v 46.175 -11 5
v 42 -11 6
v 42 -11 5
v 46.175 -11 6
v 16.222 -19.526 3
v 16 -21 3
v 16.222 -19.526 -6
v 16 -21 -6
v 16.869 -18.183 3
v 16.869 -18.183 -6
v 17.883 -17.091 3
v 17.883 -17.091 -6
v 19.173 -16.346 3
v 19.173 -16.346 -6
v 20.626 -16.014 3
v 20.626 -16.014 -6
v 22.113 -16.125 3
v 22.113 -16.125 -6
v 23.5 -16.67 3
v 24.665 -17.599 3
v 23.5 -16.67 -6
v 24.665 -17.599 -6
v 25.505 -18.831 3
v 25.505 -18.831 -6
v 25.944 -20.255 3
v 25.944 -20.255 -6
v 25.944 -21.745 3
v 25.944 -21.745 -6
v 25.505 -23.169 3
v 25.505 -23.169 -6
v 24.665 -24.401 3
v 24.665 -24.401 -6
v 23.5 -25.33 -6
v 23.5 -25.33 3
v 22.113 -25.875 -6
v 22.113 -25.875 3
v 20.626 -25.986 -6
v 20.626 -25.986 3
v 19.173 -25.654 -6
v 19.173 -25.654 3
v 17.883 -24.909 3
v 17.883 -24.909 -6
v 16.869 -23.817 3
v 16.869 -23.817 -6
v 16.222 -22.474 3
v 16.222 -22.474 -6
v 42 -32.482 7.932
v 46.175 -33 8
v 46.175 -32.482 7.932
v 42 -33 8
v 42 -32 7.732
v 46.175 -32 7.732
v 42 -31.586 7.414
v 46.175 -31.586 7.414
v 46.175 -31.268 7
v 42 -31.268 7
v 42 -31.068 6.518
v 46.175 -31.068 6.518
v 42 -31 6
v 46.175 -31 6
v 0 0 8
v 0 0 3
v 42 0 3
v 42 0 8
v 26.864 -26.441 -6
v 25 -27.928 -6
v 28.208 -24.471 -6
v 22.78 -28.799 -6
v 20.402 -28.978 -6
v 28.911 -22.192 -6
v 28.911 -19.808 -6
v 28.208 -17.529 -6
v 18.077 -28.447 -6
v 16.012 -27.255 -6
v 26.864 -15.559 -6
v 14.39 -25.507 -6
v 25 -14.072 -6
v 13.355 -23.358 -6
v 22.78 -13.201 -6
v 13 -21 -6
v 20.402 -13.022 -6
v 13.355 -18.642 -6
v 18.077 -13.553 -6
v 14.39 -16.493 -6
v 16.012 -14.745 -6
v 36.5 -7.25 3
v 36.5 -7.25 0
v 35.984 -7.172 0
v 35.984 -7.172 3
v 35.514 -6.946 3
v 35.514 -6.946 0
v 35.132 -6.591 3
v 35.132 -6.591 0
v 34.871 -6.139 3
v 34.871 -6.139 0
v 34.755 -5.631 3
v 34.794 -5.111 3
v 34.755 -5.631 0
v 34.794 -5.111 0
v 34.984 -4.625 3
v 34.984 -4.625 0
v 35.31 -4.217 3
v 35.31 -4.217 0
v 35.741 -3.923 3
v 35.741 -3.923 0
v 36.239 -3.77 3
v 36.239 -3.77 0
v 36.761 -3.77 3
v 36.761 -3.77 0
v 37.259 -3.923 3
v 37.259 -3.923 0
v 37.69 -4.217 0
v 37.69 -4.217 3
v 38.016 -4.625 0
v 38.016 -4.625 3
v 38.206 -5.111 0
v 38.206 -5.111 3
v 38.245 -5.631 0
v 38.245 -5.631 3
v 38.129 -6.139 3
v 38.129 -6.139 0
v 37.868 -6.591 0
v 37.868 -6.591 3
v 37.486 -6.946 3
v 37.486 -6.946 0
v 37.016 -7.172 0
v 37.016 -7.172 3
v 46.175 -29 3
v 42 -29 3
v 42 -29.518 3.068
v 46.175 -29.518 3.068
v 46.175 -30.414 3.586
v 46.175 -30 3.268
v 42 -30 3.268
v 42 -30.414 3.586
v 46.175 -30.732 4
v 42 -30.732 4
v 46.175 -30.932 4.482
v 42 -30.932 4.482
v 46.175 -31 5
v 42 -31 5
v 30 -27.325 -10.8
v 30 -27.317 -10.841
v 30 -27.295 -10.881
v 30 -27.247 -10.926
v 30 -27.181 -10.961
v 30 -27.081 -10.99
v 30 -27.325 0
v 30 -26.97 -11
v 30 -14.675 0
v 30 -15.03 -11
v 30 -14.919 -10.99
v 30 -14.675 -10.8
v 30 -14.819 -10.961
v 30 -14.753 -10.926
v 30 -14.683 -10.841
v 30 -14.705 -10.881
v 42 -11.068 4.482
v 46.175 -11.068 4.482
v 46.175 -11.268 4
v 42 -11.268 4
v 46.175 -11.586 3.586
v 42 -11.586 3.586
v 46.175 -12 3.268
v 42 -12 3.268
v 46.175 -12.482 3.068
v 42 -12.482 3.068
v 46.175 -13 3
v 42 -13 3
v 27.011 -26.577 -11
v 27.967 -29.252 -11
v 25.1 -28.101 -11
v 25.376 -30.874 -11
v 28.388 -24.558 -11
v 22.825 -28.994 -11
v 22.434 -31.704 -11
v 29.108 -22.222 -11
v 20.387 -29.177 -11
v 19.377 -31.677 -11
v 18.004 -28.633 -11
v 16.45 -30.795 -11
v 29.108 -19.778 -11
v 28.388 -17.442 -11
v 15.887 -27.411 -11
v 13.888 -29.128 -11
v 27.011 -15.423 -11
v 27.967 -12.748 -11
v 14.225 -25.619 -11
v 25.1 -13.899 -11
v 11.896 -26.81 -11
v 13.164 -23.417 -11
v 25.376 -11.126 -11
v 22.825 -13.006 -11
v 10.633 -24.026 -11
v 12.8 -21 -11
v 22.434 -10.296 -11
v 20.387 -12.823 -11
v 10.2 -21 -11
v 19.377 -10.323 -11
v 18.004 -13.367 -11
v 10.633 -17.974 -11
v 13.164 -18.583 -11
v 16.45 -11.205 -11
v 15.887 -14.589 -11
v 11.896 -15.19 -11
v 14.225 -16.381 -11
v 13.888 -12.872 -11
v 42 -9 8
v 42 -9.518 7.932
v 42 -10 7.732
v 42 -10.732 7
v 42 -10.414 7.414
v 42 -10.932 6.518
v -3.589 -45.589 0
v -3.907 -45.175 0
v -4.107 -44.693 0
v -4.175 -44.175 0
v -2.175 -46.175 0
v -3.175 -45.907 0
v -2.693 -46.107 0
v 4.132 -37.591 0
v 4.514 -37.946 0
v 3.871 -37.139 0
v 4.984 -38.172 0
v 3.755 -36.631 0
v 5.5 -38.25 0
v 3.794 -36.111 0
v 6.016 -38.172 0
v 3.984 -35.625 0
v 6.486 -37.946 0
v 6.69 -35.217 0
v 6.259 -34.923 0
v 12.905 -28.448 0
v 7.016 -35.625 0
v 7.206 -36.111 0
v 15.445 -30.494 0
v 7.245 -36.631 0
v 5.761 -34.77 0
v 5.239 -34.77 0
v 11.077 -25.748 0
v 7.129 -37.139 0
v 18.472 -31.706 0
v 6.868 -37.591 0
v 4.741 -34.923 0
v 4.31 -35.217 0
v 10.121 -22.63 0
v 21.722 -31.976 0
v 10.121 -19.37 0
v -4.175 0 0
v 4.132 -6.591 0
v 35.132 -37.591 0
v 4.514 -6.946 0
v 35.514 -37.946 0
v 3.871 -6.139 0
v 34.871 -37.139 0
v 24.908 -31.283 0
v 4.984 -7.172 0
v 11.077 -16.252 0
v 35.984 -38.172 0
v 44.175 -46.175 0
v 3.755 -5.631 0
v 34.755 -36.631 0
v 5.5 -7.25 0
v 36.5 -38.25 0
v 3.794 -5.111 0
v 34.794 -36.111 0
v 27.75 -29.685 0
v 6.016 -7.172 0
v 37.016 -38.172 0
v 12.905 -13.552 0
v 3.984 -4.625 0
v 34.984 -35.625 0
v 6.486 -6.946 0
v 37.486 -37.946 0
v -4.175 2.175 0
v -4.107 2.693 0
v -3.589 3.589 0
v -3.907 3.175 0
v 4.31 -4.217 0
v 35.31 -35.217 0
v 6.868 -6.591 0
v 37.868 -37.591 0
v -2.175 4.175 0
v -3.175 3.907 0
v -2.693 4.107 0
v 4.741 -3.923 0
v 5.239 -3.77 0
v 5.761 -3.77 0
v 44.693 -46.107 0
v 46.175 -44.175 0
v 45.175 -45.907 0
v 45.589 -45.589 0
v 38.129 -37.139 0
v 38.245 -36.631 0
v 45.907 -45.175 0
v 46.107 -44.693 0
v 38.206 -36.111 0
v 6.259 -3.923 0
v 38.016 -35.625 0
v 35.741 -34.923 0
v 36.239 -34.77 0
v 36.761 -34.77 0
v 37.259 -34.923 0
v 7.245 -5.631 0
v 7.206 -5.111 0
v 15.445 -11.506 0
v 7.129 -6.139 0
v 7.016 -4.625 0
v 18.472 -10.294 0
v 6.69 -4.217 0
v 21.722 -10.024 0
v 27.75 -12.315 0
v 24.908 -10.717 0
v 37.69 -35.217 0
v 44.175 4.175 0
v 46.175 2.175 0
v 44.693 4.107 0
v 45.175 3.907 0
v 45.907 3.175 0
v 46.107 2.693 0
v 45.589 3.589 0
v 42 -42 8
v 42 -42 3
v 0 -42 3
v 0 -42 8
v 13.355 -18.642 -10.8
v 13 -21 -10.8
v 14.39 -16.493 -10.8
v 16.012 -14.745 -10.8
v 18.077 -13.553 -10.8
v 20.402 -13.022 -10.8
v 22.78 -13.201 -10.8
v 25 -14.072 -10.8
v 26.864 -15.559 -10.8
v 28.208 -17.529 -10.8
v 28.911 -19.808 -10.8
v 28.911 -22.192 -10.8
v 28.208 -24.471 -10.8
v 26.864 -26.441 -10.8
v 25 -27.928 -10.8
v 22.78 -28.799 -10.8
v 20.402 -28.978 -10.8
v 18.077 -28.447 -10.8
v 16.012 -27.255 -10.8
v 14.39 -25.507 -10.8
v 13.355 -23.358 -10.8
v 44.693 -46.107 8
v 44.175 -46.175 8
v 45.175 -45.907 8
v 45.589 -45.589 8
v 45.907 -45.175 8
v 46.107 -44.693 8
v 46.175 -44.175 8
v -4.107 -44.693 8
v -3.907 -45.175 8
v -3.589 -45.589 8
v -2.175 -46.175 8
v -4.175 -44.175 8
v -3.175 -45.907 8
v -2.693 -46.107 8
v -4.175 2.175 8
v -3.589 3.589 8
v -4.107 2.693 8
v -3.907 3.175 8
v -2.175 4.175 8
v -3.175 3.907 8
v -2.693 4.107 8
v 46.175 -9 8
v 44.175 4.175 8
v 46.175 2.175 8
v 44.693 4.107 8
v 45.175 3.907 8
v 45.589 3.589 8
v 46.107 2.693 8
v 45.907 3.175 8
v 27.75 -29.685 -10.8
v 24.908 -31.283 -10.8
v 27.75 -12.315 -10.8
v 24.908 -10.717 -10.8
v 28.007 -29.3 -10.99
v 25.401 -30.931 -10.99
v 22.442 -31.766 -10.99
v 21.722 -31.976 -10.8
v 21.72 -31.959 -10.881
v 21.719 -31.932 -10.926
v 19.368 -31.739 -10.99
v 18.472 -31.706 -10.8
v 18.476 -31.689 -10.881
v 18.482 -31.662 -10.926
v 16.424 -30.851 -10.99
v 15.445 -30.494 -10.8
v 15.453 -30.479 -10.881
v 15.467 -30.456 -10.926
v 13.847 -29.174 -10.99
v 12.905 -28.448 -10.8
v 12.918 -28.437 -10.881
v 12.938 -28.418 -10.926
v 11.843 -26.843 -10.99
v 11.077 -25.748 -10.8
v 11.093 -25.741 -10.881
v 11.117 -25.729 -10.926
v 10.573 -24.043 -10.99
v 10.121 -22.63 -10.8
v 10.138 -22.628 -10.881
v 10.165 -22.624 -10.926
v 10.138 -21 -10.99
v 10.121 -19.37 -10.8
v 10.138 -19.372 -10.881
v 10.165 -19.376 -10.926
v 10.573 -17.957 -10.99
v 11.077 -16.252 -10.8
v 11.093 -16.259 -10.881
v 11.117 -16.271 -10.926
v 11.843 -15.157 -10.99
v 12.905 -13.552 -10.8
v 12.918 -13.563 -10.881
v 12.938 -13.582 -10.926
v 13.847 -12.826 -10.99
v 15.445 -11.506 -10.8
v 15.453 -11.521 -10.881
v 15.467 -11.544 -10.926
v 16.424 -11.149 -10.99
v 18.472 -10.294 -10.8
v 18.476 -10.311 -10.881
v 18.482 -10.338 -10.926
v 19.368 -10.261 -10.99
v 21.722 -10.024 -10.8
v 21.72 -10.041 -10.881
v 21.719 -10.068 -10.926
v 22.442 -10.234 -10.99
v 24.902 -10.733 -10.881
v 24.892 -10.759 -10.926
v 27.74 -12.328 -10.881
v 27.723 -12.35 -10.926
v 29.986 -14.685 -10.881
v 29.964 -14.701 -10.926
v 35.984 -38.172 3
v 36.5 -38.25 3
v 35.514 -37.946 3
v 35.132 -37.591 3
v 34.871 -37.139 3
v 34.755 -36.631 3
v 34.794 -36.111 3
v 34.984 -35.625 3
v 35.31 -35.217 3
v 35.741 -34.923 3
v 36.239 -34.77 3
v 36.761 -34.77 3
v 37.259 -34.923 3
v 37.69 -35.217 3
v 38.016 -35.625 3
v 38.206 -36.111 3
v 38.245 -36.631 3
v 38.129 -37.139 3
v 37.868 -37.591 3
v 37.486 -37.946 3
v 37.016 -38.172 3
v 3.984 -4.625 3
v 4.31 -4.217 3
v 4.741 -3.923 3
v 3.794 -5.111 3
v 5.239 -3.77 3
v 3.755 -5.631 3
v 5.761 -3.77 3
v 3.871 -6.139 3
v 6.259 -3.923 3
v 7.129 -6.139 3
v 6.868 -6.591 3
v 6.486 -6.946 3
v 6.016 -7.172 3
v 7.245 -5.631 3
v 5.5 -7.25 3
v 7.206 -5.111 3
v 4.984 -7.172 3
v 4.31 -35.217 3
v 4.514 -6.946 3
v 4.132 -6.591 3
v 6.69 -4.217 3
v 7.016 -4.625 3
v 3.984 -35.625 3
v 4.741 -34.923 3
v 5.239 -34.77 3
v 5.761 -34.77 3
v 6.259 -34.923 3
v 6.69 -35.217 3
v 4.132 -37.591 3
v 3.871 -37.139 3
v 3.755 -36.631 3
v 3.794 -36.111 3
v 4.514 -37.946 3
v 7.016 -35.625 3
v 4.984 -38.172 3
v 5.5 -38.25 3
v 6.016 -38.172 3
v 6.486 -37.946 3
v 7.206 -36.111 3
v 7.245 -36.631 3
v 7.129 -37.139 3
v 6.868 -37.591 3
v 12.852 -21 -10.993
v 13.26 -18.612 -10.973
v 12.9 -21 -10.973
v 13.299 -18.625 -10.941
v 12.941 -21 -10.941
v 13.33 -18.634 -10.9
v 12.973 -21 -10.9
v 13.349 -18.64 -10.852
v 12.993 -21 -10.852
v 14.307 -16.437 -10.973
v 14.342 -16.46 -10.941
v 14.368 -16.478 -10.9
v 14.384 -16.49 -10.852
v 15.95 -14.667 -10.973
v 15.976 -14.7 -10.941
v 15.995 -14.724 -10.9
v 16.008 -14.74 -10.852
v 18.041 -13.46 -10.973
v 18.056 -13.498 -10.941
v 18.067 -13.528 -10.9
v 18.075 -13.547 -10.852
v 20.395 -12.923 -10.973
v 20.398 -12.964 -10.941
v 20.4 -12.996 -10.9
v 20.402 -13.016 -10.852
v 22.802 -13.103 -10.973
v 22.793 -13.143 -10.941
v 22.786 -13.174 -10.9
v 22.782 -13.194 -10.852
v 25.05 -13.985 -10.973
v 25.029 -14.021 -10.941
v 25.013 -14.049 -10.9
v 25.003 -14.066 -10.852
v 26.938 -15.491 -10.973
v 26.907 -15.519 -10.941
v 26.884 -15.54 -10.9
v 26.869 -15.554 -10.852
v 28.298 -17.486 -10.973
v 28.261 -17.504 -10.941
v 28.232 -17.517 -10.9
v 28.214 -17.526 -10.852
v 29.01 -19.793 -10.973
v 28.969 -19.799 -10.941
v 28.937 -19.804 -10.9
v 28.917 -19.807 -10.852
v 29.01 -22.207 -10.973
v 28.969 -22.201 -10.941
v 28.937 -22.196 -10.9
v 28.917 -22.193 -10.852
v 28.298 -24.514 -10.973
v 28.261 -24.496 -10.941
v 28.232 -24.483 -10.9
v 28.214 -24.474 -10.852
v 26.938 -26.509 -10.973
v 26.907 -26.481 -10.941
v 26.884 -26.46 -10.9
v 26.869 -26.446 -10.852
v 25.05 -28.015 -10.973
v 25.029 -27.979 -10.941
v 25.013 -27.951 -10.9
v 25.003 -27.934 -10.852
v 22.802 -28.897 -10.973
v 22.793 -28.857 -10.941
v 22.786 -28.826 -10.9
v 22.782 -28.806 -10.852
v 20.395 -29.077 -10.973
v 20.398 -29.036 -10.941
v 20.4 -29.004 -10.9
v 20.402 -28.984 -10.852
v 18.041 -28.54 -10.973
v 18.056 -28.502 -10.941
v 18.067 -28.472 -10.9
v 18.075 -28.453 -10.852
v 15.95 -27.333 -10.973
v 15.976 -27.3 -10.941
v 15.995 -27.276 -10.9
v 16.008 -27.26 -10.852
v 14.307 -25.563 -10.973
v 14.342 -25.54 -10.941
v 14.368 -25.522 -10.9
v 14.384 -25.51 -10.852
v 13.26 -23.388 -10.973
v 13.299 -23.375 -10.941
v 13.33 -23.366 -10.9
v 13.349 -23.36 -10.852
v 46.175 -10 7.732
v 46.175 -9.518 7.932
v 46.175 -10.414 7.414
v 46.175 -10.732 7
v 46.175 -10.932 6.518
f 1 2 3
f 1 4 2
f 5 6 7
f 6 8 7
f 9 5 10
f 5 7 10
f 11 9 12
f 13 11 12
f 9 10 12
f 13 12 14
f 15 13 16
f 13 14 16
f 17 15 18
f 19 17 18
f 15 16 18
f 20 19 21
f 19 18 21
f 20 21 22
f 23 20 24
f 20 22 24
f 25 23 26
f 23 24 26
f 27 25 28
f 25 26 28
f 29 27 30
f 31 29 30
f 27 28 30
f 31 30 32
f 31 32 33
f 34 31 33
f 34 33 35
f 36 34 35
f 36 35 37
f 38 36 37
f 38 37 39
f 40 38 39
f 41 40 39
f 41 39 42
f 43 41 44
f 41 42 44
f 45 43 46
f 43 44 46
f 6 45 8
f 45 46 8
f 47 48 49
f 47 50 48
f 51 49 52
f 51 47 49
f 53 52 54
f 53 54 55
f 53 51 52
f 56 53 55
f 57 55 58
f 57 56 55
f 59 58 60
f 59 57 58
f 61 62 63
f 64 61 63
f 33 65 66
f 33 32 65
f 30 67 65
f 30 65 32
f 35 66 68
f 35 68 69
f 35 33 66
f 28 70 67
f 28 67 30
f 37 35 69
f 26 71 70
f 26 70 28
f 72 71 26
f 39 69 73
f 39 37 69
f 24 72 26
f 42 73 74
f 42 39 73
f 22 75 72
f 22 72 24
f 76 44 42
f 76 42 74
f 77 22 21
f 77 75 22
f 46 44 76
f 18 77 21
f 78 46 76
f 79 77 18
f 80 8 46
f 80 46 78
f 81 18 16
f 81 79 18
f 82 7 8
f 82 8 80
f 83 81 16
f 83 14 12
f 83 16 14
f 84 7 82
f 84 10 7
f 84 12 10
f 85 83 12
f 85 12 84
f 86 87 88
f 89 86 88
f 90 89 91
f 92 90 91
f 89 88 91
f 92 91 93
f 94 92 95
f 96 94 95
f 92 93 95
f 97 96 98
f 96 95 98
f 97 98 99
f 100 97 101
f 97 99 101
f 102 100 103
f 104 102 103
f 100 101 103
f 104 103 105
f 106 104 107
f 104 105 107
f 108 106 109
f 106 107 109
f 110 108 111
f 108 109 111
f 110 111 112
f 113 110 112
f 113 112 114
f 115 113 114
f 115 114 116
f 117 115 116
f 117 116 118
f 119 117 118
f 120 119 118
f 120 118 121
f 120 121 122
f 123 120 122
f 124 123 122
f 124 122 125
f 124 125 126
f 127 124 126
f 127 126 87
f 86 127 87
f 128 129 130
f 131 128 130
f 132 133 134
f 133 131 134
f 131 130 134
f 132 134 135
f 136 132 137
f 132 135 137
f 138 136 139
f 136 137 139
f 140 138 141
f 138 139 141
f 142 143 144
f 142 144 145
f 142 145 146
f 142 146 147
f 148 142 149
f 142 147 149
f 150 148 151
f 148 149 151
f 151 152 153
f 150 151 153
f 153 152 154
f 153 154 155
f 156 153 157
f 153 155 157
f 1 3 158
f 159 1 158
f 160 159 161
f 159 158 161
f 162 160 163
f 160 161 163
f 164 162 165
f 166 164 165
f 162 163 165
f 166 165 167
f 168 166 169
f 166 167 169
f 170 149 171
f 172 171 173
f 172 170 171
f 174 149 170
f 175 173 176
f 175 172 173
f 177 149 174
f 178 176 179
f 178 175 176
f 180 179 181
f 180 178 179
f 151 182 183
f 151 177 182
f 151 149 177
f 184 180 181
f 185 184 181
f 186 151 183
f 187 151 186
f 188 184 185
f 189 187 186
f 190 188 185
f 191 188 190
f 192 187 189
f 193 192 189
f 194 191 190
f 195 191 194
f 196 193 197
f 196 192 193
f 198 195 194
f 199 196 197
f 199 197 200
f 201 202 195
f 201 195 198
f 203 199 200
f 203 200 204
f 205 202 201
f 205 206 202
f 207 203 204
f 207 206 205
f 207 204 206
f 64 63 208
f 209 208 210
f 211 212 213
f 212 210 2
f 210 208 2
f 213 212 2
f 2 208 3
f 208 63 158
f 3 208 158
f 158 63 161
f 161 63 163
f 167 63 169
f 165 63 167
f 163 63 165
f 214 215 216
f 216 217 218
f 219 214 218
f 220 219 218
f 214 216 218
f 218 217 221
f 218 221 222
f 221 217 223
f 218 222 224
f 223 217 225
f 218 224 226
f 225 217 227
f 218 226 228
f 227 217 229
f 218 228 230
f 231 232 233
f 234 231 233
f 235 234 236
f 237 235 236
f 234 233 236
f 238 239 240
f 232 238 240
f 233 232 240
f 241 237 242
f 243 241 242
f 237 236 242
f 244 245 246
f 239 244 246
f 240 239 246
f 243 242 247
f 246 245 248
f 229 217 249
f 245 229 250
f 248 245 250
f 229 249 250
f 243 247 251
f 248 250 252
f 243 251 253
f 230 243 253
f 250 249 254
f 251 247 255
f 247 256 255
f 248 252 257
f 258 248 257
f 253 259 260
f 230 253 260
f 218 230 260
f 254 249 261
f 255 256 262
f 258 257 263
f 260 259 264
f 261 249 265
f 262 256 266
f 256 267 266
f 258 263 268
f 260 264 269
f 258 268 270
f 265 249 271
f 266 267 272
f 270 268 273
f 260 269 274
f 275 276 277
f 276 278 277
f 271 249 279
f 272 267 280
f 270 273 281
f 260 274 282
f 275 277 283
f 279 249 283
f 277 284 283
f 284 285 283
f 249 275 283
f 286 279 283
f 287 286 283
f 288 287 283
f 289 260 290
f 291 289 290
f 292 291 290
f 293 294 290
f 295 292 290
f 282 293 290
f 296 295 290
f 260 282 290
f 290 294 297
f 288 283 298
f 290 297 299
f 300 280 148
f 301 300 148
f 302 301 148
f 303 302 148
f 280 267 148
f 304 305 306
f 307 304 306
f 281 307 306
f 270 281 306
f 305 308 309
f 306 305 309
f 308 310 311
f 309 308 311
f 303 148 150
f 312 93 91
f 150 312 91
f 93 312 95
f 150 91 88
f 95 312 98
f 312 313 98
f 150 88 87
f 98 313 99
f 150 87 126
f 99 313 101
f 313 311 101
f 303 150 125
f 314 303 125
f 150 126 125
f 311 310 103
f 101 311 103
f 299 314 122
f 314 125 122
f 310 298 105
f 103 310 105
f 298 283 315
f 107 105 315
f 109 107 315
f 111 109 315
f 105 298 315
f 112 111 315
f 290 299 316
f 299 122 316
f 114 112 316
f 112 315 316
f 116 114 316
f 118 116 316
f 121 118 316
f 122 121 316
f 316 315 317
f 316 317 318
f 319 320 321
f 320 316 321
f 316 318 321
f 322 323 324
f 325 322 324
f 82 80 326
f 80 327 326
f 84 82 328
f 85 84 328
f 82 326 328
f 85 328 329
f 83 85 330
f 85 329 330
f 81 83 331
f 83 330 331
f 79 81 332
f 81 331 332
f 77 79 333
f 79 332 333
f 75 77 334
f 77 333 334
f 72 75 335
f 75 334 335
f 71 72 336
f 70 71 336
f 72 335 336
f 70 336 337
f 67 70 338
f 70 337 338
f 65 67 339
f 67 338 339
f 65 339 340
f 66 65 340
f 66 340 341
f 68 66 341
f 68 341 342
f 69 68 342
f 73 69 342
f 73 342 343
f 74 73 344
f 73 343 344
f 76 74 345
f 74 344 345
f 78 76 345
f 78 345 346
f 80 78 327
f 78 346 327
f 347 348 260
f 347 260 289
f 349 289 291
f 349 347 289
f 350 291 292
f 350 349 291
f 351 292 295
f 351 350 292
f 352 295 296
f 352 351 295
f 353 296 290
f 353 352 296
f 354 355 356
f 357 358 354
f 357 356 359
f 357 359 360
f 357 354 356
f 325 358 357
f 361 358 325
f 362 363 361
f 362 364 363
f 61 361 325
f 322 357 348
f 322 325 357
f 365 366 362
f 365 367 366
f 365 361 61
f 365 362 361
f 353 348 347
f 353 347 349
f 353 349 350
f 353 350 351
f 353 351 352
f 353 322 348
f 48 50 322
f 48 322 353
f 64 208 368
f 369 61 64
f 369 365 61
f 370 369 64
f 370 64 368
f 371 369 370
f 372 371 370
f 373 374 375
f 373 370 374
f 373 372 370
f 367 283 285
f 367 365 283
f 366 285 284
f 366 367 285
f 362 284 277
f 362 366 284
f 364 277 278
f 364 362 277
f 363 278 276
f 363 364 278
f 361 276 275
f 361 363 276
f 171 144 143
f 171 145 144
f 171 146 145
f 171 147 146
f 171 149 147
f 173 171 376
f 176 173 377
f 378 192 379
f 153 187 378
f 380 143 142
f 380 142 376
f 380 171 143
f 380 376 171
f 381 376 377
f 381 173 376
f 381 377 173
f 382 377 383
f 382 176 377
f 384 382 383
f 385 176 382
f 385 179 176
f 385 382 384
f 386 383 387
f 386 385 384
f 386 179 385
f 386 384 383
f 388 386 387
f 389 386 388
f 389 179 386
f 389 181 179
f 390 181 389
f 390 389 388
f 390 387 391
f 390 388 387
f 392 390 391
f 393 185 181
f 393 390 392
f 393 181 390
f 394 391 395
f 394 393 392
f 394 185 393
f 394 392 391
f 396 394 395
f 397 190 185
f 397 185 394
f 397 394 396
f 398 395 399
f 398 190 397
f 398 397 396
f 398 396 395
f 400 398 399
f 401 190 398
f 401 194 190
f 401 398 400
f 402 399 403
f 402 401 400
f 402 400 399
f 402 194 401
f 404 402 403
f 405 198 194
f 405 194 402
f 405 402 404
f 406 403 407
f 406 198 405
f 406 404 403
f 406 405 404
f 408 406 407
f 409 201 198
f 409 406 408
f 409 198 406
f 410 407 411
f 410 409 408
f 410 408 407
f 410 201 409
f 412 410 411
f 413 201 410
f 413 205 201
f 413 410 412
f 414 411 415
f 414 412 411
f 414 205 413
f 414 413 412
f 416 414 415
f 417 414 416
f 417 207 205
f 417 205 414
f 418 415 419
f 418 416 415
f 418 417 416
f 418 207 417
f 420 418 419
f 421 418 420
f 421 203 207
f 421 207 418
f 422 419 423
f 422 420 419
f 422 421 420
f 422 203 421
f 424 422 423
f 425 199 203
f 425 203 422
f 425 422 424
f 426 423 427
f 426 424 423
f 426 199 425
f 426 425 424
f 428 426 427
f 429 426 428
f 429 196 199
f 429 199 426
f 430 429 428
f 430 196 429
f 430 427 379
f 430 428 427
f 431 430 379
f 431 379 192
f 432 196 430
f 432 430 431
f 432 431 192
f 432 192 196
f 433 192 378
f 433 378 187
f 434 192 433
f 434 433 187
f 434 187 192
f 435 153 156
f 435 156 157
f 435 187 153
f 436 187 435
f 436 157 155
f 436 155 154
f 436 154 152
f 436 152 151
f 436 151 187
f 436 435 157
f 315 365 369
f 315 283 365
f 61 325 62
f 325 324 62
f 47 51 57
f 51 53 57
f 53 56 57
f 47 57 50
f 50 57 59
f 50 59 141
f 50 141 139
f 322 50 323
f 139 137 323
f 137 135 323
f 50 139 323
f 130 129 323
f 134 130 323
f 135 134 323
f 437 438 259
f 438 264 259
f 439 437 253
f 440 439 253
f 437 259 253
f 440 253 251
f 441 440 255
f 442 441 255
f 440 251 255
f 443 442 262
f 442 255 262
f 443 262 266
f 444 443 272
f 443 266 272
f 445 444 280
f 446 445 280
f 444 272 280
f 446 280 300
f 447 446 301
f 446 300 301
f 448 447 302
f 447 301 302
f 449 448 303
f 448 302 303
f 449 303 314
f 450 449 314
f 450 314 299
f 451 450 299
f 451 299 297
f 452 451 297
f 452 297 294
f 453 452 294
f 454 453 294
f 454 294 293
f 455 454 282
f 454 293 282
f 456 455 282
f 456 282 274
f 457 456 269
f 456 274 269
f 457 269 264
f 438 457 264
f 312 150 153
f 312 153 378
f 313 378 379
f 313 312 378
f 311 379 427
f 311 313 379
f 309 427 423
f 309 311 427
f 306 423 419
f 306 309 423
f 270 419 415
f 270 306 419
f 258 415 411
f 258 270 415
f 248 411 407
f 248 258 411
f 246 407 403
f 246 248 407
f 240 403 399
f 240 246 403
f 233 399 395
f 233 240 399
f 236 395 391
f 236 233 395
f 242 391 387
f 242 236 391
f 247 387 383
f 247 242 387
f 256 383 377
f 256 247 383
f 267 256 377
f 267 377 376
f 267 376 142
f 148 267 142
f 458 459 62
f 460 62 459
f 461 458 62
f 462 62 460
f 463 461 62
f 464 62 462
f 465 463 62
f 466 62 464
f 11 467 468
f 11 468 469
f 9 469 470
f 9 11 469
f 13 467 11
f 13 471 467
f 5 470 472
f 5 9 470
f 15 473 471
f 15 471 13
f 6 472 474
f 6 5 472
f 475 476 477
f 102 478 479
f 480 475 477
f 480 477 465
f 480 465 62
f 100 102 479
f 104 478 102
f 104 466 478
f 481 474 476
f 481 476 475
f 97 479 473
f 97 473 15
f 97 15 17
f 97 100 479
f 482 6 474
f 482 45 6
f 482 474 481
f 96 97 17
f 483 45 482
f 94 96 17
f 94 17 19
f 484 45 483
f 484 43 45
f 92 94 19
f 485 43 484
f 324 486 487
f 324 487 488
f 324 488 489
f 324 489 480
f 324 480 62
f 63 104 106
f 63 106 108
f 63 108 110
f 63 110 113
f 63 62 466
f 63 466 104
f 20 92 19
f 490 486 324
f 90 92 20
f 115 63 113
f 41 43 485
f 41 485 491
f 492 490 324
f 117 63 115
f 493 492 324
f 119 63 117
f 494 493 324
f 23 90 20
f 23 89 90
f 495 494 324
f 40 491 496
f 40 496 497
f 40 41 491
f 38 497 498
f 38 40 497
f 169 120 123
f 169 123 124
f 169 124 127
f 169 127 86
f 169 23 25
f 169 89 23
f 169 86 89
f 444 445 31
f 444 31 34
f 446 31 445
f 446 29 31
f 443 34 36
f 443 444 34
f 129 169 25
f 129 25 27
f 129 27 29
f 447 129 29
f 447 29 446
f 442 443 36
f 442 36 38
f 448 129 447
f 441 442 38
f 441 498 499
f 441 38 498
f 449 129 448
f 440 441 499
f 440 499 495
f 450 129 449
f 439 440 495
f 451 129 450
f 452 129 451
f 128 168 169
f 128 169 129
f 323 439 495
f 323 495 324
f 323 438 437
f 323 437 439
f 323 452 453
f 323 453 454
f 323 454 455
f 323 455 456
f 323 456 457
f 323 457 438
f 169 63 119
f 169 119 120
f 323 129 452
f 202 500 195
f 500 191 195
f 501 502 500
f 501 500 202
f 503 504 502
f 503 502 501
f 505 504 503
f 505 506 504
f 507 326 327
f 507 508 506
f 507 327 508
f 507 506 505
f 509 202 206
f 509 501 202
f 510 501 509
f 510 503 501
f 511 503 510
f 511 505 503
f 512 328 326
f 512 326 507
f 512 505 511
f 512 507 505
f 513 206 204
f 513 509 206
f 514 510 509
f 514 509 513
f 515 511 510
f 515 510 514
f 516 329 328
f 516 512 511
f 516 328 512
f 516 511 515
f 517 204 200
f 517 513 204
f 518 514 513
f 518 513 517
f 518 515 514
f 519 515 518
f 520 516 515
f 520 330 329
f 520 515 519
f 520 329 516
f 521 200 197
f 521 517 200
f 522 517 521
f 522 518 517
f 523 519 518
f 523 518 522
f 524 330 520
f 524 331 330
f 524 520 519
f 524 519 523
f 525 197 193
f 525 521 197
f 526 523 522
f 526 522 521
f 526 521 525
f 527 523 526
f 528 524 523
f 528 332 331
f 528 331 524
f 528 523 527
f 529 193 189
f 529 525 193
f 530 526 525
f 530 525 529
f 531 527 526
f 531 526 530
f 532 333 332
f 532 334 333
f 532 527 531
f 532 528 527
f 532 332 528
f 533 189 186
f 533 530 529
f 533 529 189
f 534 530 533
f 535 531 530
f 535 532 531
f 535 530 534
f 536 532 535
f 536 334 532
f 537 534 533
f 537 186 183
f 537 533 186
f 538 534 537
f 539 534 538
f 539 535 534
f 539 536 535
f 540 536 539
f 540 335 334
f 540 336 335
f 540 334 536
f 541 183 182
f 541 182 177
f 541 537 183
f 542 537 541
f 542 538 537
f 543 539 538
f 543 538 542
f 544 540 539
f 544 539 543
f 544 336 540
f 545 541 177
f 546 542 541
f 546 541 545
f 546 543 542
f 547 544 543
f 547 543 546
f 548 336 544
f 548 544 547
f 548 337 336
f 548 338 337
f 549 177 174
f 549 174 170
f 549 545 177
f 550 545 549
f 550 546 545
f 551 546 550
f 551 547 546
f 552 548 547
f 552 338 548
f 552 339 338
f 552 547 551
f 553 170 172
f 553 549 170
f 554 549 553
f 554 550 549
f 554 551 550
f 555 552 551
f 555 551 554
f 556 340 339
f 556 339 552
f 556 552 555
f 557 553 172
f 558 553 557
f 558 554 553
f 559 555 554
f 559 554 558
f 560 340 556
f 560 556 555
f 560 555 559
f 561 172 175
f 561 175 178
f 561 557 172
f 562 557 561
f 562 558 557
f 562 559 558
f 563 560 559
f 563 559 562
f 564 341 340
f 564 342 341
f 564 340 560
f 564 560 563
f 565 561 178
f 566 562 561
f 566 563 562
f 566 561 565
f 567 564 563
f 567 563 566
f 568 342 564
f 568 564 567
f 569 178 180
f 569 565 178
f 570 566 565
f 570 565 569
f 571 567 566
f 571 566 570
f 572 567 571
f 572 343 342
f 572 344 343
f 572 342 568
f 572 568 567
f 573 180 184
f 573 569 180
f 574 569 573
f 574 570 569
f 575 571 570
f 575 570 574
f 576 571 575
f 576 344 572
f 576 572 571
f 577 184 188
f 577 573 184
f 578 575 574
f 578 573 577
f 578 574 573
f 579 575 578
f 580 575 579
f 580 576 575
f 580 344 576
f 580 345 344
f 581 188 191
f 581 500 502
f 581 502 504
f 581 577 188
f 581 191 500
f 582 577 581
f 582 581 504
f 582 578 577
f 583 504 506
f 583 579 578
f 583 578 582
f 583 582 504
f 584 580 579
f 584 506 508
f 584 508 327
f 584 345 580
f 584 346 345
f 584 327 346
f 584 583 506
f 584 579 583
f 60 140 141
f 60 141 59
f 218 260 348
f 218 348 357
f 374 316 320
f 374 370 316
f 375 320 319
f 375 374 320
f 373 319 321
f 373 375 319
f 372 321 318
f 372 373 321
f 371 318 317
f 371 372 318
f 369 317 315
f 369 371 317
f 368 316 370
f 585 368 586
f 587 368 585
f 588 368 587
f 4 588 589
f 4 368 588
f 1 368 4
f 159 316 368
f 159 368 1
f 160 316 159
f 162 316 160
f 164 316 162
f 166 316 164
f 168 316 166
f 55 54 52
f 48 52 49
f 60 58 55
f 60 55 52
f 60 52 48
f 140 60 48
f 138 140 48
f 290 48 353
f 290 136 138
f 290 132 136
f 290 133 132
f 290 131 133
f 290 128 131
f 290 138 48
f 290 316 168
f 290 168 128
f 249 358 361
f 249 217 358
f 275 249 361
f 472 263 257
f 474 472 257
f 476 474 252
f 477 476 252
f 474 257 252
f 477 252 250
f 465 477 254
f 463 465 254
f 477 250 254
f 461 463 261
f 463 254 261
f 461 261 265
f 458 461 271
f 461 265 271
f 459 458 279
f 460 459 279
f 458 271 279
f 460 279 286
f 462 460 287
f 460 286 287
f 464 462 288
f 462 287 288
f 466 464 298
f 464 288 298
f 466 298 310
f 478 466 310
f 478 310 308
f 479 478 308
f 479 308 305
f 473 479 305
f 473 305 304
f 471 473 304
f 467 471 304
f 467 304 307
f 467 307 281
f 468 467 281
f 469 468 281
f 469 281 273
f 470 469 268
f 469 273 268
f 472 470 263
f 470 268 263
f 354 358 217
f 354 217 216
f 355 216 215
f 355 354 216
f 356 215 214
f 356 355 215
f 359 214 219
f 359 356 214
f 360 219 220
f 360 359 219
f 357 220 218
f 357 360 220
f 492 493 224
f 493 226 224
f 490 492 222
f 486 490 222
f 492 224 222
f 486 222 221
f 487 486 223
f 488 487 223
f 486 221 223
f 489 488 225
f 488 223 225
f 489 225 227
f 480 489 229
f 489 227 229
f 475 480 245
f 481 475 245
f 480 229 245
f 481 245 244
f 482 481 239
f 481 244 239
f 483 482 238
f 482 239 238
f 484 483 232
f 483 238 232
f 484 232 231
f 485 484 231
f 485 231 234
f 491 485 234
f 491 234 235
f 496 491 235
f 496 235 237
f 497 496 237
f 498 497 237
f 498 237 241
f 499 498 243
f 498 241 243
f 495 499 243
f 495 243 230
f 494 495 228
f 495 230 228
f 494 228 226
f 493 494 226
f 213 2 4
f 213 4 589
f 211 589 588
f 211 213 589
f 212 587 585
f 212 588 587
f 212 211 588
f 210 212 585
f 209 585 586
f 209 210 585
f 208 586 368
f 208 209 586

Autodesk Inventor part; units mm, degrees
ref_plane "YZ Plane" through (0, 0, 0) normal (1, 0, 0) x (0, 1, 0)
ref_plane "XZ Plane" through (0, 0, 0) normal (0, 1, 0) x (-1, 0, 0)
ref_plane "XY Plane" through (0, 0, 0) normal (0, 0, 1) x (1, 0, 0)
sketch "Sketch1" plane through (0, 0, 0) normal (0, 0, 1) x (1, 0, 0)
  line L0 (0, 0) -> (42, 0)
  line L1 (42, 0) -> (42, -42)
  line L2 (42, -42) -> (0, -42)
  line L3 (0, -42) -> (0, 0)
  line L4 (0, 0) -> (-1, 0)
  line L5 (-1, 0) -> (-4.175, 0)
  line L6 (-4.175, 0) -> (-4.175, 1)
  line L7 (-4.175, 1) -> (-4.175, 4.175)
  line L8 (-4.175, 4.175) -> (42, 4.175)
  line L9 (42, 4.175) -> (43, 4.175)
  line L10 (43, 4.175) -> (46.175, 4.175)
  line L11 (-4.175, 4.175) -> (46.175, 4.175)
  line L12 (46.175, 4.175) -> (46.175, -46.175)
  line L13 (46.175, -46.175) -> (-4.175, -46.175)
  line L14 (-4.175, -46.175) -> (-4.175, 4.175)
  dimension "d0" = 42
  dimension "d1" = 42
  dimension "d2" = 1
  dimension "d3" = 3.175
  dimension "d4" = 1
  dimension "d5" = 3.175
  dimension "d6" = 1
  dimension "d7" = 3.175
  dimension "d8" = 50.35
extrude "Extrusion1" add sketch "Sketch1" along normal blind 8
sketch "Sketch2" plane through (0, 0, 0) normal (0, 0, -1) x (-1, 0, 0)
  line L0 (0, -42) -> (0, 0) projected
  line L1 (-42, 0) -> (-42, -42) projected
  line L2 (0, 0) -> (-42, 0)
  line L3 (-42, 0) -> (-42, -42)
  line L4 (-42, -42) -> (0, -42)
  line L5 (0, -42) -> (0, 0)
extrude "Extrusion2" add sketch "Sketch2" against normal blind 3
sketch "Sketch3" plane through (0, 0, 3) normal (0, 0, 1) x (1, 0, 0)
  line L0 (0, -42) -> (0, 0) projected
  line L1 (0, -42) -> (21, -42)
  line L2 (42, 0) -> (42, -42) projected
  line L3 (21, -42) -> (21, -21)
  line L4 (21, -21) -> (21, -36.5)
  line L5 (21, -36.5) -> (36.5, -36.5)
  line L6 (36.5, -36.5) -> (5.5, -36.5)
  line L7 (5.5, -36.5) -> (5.5, -5.5)
  line L8 (5.5, -5.5) -> (36.5, -5.5)
  line L9 (36.5, -5.5) -> (36.5, -36.5)
  dimension "d13" = 21
  dimension "d14" = 21
  dimension "d15" = 15.5
  dimension "d16" = 15.5
  dimension "d17" = 31
  dimension "d18" = 31
hole "Hole1" at (5.5, -5.5, 3) at (36.5, -5.5, 3) at (36.5, -36.5, 3) at (5.5, -36.5, 3) direction (0, 0, -1) diameter 3.5 depth 3.5
sketch "Sketch4" plane through (46.175, -46.175, 0) normal (1, 0, 0) x (0, 0, -1)
  line L0 (0, 0) -> (0, 50.35) projected
  line L1 (0, 25.175) -> (-3, 25.175)
  line L2 (-3, 46.175) -> (-3, 4.175) projected
  line L3 (-3, 25.175) -> (-3, 15.175)
  line L4 (-8, 46.175) -> (-8, 4.175) projected
  line L5 (-3, 15.175) -> (-8, 15.175)
  line L6 (-8, 15.175) -> (-8, 35.175)
  line L7 (-8, 35.175) -> (-3, 35.175)
  line L8 (-3, 35.175) -> (-3, 15.175)
  point P0 (0, 46.175)
  dimension "d26" = 10
  dimension "d27" = 20
extrude "Extrusion3" cut sketch "Sketch4" against normal blind 5
fillet "Fillet1" radius 2 8 edges at (44.0875, -11, 3) (44.0875, -31, 3) (44.0875, -11, 8) (44.0875, -31, 8) (46.175, 4.175, 4) (46.175, -46.175, 4) (-4.175, -46.175, 4) (-4.175, 4.175, 4)
sketch "Sketch5" plane through (0, 0, 3) normal (0, 0, 1) x (1, 0, 0)
  line L0 (42, 0) -> (42, -9) projected
  line L1 (42, 0) -> (21, 0)
  line L2 (0, 0) -> (42, 0) projected
  line L3 (21, 0) -> (21, -21)
  dimension "d31" = 21
sketch "Sketch6" plane through (0, 0, 0) normal (0, 0, -1) x (-1, 0, 0)
  line L0 (0, 0) -> (-42, 0) projected
  line L1 (-21, 0) -> (-21, -21)
  circle A0 centre (-21, -21) radius 11
  dimension "d32" = 21
  dimension "d33" = 22
extrude "Extrusion4" add sketch "Sketch6" along normal blind 11
sketch "Sketch7" plane through (21, -21, -11) normal (0, 0, -1) x (-1, 0, 0)
  circle A0 centre (0, 0) radius 8
  point P0 (21, 21)
  dimension "d36" = 16
extrude "Extrusion5" cut sketch "Sketch7" against normal blind 5
sketch "Sketch8" plane through (21, -21, -6) normal (0, 0, -1) x (-1, 0, 0)
  circle A0 centre (0, 0) radius 5
  point P0 (21, 21)
  dimension "d39" = 10
extrude "Extrusion6" cut sketch "Sketch8" against normal blind 10
fillet "Fillet2" radius 0.2 2 edges at (29, -21, -11) (32, -21, -11)
sketch "Sketch9" plane through (21, -21, -11) normal (0, 0, -1) x (-1, 0, 0)
  line L0 (0, 0) -> (-11, 0)
  circle A0 centre (0, 0) radius 11 projected
  line L1 (-11, 0) -> (-11, -11)
  line L2 (-11, -11) -> (-9, -11)
  line L3 (-9, -11) -> (-9, 11)
  line L4 (-9, 11) -> (-11, 11)
  line L5 (-11, 11) -> (-11, -11)
  point P0 (21, 21)
  dimension "d43" = 11
  dimension "d44" = 2
  dimension "d45" = 22
extrude "Extrusion7" cut sketch "Sketch9" against normal blind 11 contours L3 A0 L0 | L0 A0 L3 | L5 L4 L3 A0 | A0 L3 L2 L1
properties part number "Yaw Shaft Mount"
